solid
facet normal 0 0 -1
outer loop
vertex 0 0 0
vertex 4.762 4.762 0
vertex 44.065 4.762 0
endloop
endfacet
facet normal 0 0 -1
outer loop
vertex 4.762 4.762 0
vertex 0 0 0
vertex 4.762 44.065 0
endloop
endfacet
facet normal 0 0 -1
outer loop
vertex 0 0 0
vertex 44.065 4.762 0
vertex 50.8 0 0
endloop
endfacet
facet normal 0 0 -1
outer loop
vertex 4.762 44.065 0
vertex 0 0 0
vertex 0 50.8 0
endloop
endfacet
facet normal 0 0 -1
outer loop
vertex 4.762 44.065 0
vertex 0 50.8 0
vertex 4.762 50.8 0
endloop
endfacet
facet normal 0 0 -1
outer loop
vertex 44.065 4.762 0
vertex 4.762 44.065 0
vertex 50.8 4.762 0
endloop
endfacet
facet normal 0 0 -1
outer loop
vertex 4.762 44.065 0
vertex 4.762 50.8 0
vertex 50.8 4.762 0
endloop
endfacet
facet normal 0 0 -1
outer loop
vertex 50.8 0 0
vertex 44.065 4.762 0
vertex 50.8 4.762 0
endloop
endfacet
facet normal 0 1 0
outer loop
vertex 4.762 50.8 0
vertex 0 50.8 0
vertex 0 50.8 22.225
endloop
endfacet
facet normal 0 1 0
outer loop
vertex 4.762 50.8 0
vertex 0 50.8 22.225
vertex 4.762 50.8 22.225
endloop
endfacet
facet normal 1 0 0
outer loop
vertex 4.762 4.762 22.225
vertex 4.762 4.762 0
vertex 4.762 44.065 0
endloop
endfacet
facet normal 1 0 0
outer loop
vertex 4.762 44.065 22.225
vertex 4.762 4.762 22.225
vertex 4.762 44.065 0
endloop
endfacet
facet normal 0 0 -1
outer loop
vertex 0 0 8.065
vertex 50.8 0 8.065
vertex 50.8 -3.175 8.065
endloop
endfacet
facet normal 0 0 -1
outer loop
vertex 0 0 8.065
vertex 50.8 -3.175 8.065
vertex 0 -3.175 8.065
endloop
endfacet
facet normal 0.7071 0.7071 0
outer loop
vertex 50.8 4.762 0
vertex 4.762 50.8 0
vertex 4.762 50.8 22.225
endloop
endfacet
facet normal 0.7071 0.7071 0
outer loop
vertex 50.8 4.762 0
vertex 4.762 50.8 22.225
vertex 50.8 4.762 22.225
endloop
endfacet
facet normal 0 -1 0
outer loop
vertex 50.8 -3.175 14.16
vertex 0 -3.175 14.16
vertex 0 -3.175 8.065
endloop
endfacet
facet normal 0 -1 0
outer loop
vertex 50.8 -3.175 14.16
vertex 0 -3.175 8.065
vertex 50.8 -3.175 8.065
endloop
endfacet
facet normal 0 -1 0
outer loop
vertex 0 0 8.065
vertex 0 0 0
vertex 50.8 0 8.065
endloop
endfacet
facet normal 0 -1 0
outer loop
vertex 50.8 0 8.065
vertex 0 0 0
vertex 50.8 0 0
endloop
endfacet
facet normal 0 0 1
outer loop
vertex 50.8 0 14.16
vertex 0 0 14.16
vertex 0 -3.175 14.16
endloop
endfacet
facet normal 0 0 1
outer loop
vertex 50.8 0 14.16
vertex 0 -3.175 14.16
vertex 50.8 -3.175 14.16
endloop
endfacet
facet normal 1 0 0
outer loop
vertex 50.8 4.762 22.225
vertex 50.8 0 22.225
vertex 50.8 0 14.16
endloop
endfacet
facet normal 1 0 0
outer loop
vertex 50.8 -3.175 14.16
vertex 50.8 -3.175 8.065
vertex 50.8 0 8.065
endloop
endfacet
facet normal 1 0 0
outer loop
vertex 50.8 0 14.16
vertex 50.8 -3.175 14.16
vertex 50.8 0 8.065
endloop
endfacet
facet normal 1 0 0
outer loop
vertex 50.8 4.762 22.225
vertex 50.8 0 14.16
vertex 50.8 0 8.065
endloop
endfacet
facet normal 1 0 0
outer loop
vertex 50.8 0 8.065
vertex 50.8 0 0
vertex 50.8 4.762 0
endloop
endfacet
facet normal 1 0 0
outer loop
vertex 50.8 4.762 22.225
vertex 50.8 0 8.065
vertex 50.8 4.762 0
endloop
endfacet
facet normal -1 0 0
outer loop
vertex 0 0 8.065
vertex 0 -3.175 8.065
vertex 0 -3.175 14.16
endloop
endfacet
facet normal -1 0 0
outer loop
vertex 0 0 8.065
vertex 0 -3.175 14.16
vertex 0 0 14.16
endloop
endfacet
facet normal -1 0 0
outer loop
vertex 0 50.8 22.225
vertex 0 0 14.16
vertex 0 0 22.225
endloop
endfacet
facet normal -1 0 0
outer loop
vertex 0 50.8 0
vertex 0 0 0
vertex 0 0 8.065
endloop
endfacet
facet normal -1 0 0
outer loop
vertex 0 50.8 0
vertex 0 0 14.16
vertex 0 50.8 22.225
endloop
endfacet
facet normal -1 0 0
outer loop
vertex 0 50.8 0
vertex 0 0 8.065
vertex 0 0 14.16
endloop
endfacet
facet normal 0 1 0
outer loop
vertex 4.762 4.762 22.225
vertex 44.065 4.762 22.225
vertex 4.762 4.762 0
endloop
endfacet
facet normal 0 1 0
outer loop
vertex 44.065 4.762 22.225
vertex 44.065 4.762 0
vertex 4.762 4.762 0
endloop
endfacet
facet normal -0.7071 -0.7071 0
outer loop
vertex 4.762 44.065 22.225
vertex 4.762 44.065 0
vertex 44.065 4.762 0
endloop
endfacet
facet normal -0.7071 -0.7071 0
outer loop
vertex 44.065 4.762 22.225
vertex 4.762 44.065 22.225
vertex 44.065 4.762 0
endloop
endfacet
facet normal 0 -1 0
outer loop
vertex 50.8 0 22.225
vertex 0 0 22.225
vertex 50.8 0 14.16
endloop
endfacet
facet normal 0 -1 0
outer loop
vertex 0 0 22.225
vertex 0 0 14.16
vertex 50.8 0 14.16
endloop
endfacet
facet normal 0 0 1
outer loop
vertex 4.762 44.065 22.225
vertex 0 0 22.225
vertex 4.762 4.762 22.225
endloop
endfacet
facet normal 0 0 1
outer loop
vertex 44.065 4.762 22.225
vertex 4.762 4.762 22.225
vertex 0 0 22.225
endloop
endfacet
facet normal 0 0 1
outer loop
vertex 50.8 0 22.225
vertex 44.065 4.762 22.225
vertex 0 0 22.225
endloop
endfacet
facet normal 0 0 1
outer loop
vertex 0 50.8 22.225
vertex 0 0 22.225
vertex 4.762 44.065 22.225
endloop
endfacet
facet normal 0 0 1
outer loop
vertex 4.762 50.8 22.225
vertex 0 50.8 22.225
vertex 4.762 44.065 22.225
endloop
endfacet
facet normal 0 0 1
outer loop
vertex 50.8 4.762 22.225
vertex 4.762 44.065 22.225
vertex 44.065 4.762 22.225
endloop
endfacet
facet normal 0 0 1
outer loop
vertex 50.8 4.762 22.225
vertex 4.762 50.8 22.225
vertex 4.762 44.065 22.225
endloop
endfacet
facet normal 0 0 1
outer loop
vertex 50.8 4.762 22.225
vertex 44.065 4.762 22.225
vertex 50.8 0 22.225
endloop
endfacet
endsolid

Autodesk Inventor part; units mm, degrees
ref_plane "YZ Plane" through (0, 0, 0) normal (1, 0, 0) x (0, 1, 0)
ref_plane "XZ Plane" through (0, 0, 0) normal (0, 1, 0) x (-1, 0, 0)
ref_plane "XY Plane" through (0, 0, 0) normal (0, 0, 1) x (1, 0, 0)
sketch "Sketch1" plane through (0, 0, 0) normal (0, 0, 1) x (1, 0, 0)
  line L0 (0, 0) -> (0, 50.8)
  line L1 (0, 0) -> (50.8, 0)
  line L2 (50.8, 4.7625) -> (4.7625, 4.7625)
  line L3 (4.7625, 4.7625) -> (4.7625, 50.8)
  line L4 (50.8, 0) -> (50.8, 4.7625)
  line L5 (0, 50.8) -> (4.7625, 50.8)
  line L6 (4.7625, 50.8) -> (50.8, 4.7625)
  line L7 (4.7625, 44.0648) -> (44.0648, 4.7625)
  dimension "d0" = 50.8
  dimension "d1" = 50.8
  dimension "d2" = 4.7625
  dimension "d3" = 4.7625
extrude "Extrusion1" add sketch "Sketch1" along normal blind 22.225 contours L0 L5 L3 L2 L4 L1 | L6 L2 L7 L3
sketch "Sketch2" plane through (0, 0, 0) normal (0, -1, 0) x (1, 0, 0)
  line L0 (0, 0) -> (0, 22.225) projected
  line L1 (0, 14.1605) -> (50.8, 14.1605)
  line L2 (50.8, 0) -> (50.8, 22.225) projected
  line L3 (50.8, 8.0645) -> (0, 8.0645)
  line L4 (0, 0) -> (50.8, 0) projected
  line L5 (50.8, 14.1605) -> (50.8, 8.0645)
  line L6 (0, 14.1605) -> (0, 8.0645)
  dimension "d6" = 6.096
  dimension "d7" = 8.0645
extrude "Extrusion2" add sketch "Sketch2" along normal blind 3.175 contours L0 L1 L2 L3
properties part number "Triangle Bracket"
